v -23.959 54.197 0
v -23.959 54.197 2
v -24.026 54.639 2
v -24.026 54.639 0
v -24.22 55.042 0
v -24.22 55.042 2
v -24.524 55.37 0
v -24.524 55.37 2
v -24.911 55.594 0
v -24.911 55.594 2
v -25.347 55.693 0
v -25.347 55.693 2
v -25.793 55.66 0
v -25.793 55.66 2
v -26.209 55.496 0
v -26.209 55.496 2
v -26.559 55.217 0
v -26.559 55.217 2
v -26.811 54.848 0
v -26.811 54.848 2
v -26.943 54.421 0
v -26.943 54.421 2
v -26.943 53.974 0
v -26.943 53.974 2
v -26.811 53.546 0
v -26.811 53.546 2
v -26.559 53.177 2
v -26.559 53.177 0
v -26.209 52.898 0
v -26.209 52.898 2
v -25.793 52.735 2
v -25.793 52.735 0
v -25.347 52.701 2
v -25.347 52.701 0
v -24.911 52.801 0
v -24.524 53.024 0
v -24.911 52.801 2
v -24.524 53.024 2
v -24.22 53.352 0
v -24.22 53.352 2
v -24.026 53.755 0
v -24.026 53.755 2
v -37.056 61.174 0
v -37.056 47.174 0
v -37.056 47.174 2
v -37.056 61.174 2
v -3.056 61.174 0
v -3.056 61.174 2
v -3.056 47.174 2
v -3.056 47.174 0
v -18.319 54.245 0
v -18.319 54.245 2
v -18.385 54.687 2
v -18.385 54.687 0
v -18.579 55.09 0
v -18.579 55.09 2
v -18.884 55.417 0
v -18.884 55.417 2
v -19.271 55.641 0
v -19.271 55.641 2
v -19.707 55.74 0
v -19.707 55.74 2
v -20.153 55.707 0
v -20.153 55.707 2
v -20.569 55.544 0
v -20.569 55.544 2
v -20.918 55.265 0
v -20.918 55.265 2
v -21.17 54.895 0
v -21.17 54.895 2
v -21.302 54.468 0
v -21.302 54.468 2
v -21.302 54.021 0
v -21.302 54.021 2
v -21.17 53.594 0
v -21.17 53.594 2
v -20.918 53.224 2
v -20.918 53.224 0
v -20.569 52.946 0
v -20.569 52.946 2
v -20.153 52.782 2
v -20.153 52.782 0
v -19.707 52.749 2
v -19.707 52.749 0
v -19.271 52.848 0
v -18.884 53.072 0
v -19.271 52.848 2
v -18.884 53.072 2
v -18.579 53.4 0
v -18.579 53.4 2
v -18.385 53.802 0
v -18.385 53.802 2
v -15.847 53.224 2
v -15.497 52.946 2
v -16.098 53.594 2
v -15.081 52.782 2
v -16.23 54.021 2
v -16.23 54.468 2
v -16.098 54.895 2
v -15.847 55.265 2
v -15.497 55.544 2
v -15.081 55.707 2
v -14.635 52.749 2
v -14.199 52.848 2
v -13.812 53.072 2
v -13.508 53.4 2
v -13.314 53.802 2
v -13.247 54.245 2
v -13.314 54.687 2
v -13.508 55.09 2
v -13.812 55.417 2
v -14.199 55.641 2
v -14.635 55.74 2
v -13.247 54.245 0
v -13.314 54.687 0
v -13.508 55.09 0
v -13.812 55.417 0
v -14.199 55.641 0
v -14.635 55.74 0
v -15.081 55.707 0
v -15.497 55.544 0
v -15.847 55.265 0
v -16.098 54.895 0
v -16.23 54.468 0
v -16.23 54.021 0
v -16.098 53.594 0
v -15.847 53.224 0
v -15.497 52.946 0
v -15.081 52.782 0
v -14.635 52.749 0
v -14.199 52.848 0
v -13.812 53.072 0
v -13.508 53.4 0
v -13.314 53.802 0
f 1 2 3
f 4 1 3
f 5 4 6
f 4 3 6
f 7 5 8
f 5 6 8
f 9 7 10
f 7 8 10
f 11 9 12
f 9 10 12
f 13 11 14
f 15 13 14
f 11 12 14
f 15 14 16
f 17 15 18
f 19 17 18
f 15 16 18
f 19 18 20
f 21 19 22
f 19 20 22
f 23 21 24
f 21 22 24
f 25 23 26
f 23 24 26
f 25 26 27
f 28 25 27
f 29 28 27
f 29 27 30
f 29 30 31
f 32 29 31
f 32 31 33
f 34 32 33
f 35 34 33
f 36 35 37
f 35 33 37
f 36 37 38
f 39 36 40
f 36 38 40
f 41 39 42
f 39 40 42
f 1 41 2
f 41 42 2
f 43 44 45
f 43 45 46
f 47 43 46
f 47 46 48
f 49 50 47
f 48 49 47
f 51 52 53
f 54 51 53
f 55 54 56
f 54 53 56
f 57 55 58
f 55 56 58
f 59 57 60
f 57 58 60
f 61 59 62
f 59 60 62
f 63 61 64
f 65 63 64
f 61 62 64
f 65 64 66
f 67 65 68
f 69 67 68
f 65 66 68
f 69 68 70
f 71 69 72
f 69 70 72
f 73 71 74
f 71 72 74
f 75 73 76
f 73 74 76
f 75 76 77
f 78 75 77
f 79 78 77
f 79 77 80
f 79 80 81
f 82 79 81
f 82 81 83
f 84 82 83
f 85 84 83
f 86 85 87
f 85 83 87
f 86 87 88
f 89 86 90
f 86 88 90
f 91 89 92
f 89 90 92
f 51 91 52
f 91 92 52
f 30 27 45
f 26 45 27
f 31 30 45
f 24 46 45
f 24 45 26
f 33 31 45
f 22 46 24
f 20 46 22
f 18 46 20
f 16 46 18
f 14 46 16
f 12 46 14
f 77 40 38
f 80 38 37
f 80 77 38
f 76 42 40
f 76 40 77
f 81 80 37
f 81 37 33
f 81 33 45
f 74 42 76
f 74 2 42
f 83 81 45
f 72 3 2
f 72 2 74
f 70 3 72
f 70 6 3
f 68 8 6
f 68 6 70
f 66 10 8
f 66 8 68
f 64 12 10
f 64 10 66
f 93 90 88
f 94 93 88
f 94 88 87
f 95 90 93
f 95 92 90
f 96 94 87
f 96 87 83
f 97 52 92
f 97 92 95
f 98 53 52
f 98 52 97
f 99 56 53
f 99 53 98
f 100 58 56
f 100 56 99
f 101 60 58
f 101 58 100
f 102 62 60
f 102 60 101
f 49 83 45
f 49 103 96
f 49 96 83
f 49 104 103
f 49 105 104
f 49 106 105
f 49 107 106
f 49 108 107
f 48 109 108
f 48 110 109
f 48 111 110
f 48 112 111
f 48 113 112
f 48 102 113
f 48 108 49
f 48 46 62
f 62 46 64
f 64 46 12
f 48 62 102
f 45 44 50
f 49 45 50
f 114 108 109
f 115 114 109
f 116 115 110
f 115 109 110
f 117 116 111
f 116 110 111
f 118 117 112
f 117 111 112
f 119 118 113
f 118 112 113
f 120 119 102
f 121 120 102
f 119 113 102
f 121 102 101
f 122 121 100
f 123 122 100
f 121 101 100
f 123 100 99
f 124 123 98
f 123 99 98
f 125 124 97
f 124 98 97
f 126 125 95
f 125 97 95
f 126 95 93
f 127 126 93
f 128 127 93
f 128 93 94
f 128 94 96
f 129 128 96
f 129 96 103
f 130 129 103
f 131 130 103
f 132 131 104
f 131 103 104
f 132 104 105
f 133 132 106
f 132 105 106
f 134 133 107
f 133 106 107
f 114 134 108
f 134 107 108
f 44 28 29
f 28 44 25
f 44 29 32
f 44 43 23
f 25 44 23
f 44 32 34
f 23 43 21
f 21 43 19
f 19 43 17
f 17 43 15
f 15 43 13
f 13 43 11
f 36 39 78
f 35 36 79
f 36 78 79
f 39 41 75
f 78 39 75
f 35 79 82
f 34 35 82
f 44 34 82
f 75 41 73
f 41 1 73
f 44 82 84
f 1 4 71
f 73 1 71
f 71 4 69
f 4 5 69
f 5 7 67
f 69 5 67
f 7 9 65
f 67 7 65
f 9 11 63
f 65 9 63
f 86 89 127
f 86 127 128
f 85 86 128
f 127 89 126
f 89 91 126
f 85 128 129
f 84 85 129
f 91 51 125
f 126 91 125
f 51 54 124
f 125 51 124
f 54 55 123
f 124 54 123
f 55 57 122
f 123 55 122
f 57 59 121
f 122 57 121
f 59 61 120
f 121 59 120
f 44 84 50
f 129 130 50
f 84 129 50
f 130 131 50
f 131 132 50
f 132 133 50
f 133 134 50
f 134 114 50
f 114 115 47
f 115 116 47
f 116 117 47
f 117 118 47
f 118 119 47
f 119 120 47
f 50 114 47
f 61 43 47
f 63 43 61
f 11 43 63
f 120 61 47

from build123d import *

# Parameters (mm, degrees)
SKETCH1_W           = 34
SKETCH1_H           = 14
BOSS_EXTRUDE1_DEPTH = 2
SKETCH3_R           = 1.5
CUT_EXTRUDE1_DEPTH  = 2
SKETCH4_R           = 1.5
CUT_EXTRUDE2_DEPTH  = 2


with BuildPart() as part:
    # Sketch1 → Boss-Extrude1 (new body)
    with BuildSketch(Plane(origin=(0.099311048, 0, 0), x_dir=(1, 0, 0), z_dir=(0, 0, 1))):
        with Locations((-20.155081556, 54.173525721)):
            Rectangle(SKETCH1_W, SKETCH1_H)
    extrude(amount=BOSS_EXTRUDE1_DEPTH)

    # Sketch3 → Cut-Extrude1 (cut)
    with BuildSketch(Plane(origin=(0.099311048, 0, 2), x_dir=(1, 0, 0), z_dir=(0, 0, 1))):
        with Locations((-25.558678377, 54.197225708)):
            Circle(SKETCH3_R)
    extrude(amount=-CUT_EXTRUDE1_DEPTH, mode=Mode.SUBTRACT)

    # Sketch4 → Cut-Extrude2 (cut)
    with BuildSketch(Plane(origin=(0.099311048, 0, 2), x_dir=(1, 0, 0), z_dir=(0, 0, 1))):
        with Locations((-19.918081695, 54.24462568)):
            Circle(SKETCH4_R)
        with Locations((-14.846284679, 54.24462568)):
            Circle(SKETCH4_R)
    extrude(amount=-CUT_EXTRUDE2_DEPTH, mode=Mode.SUBTRACT)


solid = part.part
